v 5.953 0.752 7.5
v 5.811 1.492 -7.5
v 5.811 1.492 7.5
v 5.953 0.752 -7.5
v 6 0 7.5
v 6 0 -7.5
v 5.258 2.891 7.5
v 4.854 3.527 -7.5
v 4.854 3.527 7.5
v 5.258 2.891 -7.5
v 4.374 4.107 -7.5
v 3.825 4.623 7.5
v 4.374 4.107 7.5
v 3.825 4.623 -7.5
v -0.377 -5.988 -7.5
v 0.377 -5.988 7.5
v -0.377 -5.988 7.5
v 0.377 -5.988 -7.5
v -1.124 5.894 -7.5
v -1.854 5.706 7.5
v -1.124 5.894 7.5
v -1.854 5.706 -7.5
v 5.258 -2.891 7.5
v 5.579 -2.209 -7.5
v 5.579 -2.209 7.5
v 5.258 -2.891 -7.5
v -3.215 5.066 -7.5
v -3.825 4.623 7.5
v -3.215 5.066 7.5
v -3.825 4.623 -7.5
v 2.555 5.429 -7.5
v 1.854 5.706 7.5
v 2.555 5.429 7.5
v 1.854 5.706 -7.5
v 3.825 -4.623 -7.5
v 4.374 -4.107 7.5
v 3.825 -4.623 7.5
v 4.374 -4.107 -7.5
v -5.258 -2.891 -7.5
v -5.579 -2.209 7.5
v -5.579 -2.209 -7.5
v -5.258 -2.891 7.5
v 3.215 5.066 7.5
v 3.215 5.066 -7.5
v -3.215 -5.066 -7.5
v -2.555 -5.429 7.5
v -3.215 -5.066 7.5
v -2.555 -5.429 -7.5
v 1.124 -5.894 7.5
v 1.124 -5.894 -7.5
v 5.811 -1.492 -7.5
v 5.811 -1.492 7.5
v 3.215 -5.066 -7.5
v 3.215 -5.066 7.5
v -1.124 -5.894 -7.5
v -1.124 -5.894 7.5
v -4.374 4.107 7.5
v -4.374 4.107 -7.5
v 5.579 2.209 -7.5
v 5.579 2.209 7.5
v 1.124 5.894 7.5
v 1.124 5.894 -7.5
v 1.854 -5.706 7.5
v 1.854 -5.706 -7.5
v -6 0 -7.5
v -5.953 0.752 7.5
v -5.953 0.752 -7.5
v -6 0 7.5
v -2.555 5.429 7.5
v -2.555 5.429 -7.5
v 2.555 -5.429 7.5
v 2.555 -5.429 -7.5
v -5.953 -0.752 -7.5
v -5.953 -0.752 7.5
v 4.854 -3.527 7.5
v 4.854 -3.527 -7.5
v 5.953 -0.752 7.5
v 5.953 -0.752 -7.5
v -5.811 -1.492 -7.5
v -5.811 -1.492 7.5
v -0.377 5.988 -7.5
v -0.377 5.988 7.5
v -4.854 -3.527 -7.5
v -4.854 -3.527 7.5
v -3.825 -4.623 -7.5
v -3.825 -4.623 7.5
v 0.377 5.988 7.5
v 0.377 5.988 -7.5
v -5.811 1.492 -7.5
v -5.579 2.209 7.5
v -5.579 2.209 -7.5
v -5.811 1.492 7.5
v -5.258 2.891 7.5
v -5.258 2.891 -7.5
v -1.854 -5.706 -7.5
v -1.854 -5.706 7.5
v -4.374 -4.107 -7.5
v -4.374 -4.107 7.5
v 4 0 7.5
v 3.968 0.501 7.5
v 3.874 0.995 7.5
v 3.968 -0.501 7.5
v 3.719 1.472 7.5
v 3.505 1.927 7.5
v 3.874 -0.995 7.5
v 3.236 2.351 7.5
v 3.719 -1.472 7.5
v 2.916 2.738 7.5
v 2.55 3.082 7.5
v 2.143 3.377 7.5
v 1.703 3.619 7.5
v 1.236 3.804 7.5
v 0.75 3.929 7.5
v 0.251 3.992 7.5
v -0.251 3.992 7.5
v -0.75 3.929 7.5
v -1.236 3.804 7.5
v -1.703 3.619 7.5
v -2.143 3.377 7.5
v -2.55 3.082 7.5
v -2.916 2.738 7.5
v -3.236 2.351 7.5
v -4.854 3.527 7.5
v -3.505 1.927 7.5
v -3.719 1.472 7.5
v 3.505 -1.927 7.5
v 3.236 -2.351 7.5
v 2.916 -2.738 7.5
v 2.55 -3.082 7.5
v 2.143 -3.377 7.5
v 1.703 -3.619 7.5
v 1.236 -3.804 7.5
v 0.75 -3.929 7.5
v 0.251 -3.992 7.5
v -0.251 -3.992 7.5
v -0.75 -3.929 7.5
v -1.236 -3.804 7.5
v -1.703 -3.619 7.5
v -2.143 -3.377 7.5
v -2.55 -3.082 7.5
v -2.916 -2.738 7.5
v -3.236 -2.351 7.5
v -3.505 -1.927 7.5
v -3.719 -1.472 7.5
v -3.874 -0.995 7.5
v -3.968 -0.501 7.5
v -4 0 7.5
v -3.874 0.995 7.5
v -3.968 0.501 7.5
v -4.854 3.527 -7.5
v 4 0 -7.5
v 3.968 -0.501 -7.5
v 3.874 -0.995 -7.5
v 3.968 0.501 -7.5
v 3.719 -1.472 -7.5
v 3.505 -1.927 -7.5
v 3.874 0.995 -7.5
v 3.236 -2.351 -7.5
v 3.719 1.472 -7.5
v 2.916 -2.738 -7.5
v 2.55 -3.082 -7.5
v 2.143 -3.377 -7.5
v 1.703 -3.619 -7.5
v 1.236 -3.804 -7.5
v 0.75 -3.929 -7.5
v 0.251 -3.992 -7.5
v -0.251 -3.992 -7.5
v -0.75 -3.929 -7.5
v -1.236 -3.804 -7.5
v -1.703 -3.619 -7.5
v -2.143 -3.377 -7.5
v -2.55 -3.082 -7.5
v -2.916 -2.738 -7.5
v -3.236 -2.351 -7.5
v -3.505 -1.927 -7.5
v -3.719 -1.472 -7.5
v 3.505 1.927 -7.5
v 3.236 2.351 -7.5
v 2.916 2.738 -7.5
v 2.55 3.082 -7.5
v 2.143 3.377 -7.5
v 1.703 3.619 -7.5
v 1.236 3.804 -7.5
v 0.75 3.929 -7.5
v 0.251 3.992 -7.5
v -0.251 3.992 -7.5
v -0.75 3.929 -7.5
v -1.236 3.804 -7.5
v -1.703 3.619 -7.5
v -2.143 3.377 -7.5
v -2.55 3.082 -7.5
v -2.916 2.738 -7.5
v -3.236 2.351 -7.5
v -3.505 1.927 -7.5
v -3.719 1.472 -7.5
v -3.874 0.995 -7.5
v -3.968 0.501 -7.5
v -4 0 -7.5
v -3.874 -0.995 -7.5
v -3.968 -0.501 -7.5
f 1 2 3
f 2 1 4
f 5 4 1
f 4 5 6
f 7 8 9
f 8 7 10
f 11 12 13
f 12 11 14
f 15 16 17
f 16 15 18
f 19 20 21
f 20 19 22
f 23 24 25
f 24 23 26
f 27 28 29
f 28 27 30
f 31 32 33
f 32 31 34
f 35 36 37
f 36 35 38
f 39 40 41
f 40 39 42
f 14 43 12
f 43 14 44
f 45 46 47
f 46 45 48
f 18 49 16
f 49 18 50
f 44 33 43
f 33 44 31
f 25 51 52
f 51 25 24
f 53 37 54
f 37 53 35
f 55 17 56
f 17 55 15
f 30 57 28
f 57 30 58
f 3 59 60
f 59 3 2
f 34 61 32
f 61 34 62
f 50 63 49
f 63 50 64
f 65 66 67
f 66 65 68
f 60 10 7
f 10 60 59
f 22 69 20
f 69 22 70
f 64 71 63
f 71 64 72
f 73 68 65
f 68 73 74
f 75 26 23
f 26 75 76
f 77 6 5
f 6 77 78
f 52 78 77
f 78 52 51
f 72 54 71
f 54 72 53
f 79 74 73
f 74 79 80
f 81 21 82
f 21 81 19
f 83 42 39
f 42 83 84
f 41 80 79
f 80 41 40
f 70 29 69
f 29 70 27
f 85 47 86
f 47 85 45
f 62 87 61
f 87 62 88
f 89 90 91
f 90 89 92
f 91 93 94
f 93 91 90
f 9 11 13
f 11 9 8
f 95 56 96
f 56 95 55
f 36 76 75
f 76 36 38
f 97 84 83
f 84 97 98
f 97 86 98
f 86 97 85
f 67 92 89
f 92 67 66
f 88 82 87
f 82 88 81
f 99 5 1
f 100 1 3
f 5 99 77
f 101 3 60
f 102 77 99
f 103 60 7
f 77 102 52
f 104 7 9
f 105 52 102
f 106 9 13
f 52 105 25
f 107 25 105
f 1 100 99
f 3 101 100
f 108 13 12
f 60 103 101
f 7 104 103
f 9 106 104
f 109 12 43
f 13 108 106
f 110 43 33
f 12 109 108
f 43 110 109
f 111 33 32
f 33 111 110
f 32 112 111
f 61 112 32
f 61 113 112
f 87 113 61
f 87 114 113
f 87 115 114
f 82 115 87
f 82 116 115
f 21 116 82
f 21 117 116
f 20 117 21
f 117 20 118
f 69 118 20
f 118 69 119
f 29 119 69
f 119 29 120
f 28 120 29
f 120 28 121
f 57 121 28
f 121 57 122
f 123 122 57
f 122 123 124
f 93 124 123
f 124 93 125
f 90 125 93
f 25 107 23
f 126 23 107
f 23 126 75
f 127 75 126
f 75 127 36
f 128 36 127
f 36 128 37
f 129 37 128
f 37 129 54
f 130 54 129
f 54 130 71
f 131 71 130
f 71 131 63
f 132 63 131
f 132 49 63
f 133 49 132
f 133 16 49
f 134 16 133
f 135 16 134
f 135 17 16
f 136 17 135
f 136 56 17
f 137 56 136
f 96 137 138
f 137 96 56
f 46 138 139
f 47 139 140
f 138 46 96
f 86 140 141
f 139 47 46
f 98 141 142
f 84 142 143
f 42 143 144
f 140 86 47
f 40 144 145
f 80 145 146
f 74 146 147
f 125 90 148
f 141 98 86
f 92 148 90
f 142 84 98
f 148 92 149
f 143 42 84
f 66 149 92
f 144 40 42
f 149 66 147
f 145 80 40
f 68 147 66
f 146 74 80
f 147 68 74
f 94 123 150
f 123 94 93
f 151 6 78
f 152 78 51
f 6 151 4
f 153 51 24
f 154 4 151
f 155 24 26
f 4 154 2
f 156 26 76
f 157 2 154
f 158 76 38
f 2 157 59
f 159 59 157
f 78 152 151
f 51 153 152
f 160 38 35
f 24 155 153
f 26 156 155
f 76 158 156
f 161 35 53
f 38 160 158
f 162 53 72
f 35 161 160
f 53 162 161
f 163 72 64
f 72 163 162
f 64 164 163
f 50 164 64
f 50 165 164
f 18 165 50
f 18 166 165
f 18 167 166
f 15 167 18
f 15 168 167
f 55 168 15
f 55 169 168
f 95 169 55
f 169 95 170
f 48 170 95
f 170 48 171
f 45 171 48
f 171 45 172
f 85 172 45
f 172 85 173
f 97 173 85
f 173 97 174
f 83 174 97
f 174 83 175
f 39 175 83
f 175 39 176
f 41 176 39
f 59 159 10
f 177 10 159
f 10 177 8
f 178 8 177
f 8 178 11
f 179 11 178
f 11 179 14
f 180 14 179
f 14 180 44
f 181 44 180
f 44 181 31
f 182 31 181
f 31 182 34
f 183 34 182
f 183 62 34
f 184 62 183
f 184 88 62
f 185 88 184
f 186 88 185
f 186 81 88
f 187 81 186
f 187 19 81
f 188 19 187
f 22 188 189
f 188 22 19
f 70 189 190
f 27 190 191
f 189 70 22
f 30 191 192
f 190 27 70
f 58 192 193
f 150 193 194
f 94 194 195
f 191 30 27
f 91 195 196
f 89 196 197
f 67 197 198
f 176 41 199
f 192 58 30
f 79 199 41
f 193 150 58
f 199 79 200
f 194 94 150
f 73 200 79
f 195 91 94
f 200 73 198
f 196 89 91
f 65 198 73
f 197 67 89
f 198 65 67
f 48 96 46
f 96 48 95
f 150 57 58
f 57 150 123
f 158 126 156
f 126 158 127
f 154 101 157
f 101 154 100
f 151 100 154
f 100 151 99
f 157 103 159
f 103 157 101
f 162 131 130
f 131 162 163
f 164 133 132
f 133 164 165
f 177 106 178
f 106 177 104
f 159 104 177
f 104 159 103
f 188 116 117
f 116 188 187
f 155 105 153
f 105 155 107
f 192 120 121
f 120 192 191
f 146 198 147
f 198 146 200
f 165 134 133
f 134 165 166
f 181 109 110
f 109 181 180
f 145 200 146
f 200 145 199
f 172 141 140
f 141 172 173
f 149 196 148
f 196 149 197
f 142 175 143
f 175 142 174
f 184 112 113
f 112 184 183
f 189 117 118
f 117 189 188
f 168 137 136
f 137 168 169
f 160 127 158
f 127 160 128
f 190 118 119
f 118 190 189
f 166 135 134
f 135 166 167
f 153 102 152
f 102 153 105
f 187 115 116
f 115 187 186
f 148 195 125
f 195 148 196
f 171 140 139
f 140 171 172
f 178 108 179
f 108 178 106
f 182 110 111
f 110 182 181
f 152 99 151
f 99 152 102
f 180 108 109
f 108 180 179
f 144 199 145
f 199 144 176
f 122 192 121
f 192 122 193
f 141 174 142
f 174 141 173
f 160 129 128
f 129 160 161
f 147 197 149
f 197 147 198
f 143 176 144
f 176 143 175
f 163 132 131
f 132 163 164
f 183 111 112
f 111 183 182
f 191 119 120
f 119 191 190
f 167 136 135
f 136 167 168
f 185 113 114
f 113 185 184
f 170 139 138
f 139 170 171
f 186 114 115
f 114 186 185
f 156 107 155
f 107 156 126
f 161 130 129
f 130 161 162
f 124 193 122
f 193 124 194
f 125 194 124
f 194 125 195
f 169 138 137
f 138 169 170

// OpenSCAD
$fn = 50;


difference() {
	union() {
		translate(v = [0, 0, -7.5000000000]) {
			cylinder(h = 15, r = 6.0000000000);
		}
	}
	union() {
		translate(v = [0, 0, -100.0000000000]) {
			cylinder(h = 200, r = 4.0000000000);
		}
	}
}
